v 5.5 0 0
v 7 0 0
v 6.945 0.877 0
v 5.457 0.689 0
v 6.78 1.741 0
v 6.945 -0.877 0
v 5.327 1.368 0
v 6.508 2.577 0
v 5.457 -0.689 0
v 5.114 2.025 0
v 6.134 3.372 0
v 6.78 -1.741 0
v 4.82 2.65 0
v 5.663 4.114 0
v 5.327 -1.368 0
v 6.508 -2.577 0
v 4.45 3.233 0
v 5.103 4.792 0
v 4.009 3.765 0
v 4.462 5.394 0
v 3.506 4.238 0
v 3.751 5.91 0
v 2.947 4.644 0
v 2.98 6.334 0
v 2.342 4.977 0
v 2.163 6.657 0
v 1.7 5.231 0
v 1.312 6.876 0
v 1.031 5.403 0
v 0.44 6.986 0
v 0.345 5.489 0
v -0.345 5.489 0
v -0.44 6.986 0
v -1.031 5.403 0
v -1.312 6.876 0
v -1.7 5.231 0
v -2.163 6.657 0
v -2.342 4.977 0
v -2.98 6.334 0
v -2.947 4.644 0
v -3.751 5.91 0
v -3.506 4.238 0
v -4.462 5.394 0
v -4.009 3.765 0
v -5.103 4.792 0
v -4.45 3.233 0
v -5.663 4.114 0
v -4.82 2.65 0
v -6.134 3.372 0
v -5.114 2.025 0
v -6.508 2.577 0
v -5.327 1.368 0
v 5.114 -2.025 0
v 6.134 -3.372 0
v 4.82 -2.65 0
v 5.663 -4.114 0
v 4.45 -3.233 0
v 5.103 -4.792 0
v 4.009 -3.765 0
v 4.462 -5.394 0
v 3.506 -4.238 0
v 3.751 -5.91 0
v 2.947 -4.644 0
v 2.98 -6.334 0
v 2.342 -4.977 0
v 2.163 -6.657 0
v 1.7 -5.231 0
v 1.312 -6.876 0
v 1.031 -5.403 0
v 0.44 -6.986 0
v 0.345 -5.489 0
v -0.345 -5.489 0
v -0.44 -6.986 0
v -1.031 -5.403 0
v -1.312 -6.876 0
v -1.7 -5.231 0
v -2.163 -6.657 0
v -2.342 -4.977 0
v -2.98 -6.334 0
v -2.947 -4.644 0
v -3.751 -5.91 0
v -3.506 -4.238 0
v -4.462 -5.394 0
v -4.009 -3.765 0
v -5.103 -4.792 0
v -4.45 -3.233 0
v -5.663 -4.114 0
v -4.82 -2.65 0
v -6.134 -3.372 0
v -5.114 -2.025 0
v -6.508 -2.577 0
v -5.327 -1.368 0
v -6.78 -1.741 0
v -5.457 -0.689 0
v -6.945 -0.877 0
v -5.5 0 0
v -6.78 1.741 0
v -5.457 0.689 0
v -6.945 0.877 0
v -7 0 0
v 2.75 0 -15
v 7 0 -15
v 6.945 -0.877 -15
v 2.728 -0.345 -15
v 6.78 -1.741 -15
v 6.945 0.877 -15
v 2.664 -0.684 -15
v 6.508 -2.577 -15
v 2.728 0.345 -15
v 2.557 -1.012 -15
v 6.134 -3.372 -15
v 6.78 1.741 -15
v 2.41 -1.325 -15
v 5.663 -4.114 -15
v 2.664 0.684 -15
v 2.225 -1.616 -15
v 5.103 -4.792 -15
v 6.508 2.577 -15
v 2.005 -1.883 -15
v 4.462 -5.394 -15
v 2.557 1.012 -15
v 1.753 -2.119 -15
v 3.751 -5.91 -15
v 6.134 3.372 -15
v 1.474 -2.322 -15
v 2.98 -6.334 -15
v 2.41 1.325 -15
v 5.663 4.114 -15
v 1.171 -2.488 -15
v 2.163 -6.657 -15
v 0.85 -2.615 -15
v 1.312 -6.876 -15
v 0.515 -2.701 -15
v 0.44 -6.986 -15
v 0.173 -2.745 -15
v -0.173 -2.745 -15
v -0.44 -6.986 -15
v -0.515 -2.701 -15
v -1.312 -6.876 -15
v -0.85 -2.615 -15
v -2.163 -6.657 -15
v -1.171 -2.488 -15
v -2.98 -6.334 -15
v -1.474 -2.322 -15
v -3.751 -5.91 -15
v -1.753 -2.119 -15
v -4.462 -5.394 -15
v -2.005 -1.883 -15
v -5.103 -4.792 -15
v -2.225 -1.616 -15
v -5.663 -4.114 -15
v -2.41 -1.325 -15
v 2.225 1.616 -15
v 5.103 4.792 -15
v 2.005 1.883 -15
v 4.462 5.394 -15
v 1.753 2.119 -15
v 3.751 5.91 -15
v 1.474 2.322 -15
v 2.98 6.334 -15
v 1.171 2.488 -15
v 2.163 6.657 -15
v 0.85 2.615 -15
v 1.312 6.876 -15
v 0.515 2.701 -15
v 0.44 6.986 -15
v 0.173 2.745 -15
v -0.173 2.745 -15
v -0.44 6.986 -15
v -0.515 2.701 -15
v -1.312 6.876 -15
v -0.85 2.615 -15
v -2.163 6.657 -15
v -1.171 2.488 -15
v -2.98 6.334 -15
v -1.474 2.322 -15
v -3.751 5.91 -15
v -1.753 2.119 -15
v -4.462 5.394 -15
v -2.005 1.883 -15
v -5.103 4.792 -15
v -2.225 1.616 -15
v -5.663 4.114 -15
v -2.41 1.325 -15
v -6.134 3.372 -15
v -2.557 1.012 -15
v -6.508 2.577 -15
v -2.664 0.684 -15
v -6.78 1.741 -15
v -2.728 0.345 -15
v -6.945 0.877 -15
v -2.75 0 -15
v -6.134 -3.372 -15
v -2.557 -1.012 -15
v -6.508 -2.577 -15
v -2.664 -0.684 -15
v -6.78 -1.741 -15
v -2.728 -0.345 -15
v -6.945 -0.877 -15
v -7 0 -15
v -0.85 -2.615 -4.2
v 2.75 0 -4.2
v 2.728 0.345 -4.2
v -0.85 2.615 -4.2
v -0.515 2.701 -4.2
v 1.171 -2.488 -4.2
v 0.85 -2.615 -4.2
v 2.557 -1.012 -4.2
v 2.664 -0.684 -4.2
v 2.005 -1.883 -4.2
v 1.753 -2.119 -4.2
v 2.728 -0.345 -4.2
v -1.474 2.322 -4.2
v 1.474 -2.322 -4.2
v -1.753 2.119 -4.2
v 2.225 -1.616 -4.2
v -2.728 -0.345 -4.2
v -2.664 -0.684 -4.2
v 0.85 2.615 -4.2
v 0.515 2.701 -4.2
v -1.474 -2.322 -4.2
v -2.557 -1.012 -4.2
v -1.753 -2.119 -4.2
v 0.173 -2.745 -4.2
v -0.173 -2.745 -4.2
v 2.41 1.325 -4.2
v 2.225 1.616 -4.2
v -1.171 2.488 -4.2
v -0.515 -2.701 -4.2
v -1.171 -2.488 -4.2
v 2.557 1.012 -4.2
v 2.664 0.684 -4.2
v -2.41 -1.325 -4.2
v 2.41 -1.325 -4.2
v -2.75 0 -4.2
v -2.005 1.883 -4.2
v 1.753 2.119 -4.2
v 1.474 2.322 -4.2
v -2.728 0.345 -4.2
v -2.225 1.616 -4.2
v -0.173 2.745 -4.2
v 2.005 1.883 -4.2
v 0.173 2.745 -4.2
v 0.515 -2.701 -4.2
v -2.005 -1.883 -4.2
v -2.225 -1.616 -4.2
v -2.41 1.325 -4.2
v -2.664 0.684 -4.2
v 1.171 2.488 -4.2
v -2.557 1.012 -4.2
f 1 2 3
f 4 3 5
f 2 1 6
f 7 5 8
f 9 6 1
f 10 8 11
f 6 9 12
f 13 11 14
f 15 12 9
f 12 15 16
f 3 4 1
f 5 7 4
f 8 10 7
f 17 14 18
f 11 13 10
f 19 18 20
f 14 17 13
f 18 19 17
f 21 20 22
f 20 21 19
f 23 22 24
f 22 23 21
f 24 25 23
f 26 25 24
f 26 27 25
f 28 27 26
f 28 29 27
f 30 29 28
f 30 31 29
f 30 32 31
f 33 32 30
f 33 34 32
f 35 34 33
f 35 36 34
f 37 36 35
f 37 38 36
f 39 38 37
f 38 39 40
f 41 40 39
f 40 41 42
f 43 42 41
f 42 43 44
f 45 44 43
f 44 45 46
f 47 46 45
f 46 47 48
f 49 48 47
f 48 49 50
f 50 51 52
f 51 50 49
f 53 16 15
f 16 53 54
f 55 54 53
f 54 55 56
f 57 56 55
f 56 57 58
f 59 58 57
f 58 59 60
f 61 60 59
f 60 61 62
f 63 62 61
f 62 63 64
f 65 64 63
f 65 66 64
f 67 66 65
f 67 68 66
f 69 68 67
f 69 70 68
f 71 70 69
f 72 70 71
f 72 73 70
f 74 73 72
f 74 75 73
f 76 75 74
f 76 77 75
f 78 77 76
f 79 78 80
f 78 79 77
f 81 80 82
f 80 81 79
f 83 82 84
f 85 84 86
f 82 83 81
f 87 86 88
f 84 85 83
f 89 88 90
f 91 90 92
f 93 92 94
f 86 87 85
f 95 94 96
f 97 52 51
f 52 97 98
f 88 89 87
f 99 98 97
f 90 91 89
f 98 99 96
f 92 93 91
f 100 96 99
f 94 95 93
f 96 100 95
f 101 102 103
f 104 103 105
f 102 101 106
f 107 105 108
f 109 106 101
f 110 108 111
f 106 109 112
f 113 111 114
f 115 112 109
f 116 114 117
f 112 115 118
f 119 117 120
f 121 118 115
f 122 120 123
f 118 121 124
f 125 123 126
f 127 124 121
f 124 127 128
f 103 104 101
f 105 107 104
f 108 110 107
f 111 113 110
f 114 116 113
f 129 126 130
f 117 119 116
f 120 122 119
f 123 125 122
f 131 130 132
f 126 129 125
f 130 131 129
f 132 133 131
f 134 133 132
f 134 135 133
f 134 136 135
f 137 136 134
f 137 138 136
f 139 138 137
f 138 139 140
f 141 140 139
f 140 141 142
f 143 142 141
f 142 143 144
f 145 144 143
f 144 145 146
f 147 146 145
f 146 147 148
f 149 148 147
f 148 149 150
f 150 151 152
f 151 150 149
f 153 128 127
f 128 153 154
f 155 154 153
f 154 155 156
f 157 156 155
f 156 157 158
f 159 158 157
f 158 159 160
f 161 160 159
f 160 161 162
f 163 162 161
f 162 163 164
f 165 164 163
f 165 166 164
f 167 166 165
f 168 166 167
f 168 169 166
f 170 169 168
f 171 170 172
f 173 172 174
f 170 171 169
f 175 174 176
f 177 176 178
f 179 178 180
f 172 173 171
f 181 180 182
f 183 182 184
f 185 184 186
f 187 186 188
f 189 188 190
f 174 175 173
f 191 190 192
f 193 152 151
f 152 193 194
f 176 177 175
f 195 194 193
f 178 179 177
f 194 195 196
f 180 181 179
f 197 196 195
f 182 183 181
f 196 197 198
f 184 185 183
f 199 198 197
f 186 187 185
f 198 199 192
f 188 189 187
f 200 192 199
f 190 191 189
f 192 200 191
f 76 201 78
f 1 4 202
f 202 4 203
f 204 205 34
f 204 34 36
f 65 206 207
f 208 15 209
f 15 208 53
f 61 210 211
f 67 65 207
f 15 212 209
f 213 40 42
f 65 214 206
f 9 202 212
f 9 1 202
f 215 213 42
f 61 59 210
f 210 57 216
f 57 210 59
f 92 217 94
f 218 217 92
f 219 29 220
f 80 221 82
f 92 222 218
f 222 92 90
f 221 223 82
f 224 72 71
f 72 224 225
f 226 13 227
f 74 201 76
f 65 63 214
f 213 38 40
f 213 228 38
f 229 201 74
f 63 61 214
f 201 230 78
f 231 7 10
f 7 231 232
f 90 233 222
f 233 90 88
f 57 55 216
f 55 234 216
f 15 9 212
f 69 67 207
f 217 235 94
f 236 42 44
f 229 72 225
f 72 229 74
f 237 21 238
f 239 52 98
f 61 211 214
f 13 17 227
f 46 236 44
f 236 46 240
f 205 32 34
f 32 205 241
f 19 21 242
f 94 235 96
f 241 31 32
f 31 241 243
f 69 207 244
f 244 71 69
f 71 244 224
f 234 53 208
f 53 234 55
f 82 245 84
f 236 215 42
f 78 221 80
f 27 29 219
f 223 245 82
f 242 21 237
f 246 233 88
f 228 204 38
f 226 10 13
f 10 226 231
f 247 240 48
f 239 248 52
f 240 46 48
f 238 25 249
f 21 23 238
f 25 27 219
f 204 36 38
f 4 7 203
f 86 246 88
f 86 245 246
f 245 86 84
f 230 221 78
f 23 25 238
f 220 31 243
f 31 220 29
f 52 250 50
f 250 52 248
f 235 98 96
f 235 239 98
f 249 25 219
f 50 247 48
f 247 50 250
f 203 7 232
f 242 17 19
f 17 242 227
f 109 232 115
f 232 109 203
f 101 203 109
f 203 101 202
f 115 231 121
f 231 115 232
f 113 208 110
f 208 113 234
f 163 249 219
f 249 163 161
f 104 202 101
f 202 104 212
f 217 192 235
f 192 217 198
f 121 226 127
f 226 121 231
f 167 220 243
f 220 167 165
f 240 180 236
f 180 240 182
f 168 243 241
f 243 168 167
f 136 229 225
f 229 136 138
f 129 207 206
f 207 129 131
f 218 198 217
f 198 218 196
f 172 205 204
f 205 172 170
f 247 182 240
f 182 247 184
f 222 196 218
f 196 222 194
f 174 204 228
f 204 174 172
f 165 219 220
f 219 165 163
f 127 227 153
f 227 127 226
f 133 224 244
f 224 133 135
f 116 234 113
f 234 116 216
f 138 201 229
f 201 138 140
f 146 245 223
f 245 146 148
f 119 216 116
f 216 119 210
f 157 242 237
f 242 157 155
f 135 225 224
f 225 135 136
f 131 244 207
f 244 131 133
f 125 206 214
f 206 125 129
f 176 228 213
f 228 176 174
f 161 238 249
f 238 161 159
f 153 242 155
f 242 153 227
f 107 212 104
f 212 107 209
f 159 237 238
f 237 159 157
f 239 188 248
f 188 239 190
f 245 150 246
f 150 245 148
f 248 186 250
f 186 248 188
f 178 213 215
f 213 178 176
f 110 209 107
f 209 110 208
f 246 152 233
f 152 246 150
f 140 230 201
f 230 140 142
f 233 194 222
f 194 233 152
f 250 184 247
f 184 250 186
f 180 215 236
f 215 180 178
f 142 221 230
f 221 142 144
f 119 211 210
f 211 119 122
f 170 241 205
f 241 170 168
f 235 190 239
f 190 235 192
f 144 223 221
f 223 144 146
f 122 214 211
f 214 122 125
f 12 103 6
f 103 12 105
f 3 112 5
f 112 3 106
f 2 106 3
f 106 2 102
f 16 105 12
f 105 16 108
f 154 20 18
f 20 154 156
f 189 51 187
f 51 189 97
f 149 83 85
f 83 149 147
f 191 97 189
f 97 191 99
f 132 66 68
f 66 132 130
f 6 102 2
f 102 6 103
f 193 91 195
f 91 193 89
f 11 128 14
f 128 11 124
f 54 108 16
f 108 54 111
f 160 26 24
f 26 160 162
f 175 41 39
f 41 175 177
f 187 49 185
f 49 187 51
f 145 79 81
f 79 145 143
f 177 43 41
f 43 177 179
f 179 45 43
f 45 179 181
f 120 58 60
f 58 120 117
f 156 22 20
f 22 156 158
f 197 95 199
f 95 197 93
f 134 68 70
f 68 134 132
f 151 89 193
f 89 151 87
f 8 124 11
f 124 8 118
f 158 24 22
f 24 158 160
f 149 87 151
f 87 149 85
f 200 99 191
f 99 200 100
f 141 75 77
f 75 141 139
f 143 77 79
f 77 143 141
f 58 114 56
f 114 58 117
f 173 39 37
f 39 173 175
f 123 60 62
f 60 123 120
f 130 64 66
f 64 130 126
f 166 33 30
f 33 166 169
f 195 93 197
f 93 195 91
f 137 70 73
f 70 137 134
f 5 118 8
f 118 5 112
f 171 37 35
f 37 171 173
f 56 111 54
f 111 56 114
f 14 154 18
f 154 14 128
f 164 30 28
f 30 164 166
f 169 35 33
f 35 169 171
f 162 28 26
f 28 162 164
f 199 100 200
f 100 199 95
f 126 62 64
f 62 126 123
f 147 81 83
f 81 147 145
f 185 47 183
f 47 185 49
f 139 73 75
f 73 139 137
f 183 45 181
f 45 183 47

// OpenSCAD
$fn = 50;


difference() {
	union() {
		translate(v = [0, 0, -15.0000000000]) {
			cylinder(h = 15, r = 7.0000000000);
		}
		cylinder(h = 0, r = 16.0000000000);
	}
	union() {
		translate(v = [0, 0, 0]) {
			rotate(a = [0, 0, 0]) {
				difference() {
					union() {
						#translate(v = [0, 0, -15.0000000000]) {
							cylinder(h = 15, r = 2.2500000000);
						}
						#translate(v = [0, 0, -4.2000000000]) {
							cylinder(h = 4.2000000000, r = 7.0000000000, r1 = 2.7500000000, r2 = 5.5000000000);
						}
						#translate(v = [0, 0, -15.0000000000]) {
							cylinder(h = 15, r = 2.7500000000);
						}
						#translate(v = [0, 0, -15.0000000000]) {
							cylinder(h = 15, r = 2.2500000000);
						}
					}
					union();
				}
			}
		}
	}
}
